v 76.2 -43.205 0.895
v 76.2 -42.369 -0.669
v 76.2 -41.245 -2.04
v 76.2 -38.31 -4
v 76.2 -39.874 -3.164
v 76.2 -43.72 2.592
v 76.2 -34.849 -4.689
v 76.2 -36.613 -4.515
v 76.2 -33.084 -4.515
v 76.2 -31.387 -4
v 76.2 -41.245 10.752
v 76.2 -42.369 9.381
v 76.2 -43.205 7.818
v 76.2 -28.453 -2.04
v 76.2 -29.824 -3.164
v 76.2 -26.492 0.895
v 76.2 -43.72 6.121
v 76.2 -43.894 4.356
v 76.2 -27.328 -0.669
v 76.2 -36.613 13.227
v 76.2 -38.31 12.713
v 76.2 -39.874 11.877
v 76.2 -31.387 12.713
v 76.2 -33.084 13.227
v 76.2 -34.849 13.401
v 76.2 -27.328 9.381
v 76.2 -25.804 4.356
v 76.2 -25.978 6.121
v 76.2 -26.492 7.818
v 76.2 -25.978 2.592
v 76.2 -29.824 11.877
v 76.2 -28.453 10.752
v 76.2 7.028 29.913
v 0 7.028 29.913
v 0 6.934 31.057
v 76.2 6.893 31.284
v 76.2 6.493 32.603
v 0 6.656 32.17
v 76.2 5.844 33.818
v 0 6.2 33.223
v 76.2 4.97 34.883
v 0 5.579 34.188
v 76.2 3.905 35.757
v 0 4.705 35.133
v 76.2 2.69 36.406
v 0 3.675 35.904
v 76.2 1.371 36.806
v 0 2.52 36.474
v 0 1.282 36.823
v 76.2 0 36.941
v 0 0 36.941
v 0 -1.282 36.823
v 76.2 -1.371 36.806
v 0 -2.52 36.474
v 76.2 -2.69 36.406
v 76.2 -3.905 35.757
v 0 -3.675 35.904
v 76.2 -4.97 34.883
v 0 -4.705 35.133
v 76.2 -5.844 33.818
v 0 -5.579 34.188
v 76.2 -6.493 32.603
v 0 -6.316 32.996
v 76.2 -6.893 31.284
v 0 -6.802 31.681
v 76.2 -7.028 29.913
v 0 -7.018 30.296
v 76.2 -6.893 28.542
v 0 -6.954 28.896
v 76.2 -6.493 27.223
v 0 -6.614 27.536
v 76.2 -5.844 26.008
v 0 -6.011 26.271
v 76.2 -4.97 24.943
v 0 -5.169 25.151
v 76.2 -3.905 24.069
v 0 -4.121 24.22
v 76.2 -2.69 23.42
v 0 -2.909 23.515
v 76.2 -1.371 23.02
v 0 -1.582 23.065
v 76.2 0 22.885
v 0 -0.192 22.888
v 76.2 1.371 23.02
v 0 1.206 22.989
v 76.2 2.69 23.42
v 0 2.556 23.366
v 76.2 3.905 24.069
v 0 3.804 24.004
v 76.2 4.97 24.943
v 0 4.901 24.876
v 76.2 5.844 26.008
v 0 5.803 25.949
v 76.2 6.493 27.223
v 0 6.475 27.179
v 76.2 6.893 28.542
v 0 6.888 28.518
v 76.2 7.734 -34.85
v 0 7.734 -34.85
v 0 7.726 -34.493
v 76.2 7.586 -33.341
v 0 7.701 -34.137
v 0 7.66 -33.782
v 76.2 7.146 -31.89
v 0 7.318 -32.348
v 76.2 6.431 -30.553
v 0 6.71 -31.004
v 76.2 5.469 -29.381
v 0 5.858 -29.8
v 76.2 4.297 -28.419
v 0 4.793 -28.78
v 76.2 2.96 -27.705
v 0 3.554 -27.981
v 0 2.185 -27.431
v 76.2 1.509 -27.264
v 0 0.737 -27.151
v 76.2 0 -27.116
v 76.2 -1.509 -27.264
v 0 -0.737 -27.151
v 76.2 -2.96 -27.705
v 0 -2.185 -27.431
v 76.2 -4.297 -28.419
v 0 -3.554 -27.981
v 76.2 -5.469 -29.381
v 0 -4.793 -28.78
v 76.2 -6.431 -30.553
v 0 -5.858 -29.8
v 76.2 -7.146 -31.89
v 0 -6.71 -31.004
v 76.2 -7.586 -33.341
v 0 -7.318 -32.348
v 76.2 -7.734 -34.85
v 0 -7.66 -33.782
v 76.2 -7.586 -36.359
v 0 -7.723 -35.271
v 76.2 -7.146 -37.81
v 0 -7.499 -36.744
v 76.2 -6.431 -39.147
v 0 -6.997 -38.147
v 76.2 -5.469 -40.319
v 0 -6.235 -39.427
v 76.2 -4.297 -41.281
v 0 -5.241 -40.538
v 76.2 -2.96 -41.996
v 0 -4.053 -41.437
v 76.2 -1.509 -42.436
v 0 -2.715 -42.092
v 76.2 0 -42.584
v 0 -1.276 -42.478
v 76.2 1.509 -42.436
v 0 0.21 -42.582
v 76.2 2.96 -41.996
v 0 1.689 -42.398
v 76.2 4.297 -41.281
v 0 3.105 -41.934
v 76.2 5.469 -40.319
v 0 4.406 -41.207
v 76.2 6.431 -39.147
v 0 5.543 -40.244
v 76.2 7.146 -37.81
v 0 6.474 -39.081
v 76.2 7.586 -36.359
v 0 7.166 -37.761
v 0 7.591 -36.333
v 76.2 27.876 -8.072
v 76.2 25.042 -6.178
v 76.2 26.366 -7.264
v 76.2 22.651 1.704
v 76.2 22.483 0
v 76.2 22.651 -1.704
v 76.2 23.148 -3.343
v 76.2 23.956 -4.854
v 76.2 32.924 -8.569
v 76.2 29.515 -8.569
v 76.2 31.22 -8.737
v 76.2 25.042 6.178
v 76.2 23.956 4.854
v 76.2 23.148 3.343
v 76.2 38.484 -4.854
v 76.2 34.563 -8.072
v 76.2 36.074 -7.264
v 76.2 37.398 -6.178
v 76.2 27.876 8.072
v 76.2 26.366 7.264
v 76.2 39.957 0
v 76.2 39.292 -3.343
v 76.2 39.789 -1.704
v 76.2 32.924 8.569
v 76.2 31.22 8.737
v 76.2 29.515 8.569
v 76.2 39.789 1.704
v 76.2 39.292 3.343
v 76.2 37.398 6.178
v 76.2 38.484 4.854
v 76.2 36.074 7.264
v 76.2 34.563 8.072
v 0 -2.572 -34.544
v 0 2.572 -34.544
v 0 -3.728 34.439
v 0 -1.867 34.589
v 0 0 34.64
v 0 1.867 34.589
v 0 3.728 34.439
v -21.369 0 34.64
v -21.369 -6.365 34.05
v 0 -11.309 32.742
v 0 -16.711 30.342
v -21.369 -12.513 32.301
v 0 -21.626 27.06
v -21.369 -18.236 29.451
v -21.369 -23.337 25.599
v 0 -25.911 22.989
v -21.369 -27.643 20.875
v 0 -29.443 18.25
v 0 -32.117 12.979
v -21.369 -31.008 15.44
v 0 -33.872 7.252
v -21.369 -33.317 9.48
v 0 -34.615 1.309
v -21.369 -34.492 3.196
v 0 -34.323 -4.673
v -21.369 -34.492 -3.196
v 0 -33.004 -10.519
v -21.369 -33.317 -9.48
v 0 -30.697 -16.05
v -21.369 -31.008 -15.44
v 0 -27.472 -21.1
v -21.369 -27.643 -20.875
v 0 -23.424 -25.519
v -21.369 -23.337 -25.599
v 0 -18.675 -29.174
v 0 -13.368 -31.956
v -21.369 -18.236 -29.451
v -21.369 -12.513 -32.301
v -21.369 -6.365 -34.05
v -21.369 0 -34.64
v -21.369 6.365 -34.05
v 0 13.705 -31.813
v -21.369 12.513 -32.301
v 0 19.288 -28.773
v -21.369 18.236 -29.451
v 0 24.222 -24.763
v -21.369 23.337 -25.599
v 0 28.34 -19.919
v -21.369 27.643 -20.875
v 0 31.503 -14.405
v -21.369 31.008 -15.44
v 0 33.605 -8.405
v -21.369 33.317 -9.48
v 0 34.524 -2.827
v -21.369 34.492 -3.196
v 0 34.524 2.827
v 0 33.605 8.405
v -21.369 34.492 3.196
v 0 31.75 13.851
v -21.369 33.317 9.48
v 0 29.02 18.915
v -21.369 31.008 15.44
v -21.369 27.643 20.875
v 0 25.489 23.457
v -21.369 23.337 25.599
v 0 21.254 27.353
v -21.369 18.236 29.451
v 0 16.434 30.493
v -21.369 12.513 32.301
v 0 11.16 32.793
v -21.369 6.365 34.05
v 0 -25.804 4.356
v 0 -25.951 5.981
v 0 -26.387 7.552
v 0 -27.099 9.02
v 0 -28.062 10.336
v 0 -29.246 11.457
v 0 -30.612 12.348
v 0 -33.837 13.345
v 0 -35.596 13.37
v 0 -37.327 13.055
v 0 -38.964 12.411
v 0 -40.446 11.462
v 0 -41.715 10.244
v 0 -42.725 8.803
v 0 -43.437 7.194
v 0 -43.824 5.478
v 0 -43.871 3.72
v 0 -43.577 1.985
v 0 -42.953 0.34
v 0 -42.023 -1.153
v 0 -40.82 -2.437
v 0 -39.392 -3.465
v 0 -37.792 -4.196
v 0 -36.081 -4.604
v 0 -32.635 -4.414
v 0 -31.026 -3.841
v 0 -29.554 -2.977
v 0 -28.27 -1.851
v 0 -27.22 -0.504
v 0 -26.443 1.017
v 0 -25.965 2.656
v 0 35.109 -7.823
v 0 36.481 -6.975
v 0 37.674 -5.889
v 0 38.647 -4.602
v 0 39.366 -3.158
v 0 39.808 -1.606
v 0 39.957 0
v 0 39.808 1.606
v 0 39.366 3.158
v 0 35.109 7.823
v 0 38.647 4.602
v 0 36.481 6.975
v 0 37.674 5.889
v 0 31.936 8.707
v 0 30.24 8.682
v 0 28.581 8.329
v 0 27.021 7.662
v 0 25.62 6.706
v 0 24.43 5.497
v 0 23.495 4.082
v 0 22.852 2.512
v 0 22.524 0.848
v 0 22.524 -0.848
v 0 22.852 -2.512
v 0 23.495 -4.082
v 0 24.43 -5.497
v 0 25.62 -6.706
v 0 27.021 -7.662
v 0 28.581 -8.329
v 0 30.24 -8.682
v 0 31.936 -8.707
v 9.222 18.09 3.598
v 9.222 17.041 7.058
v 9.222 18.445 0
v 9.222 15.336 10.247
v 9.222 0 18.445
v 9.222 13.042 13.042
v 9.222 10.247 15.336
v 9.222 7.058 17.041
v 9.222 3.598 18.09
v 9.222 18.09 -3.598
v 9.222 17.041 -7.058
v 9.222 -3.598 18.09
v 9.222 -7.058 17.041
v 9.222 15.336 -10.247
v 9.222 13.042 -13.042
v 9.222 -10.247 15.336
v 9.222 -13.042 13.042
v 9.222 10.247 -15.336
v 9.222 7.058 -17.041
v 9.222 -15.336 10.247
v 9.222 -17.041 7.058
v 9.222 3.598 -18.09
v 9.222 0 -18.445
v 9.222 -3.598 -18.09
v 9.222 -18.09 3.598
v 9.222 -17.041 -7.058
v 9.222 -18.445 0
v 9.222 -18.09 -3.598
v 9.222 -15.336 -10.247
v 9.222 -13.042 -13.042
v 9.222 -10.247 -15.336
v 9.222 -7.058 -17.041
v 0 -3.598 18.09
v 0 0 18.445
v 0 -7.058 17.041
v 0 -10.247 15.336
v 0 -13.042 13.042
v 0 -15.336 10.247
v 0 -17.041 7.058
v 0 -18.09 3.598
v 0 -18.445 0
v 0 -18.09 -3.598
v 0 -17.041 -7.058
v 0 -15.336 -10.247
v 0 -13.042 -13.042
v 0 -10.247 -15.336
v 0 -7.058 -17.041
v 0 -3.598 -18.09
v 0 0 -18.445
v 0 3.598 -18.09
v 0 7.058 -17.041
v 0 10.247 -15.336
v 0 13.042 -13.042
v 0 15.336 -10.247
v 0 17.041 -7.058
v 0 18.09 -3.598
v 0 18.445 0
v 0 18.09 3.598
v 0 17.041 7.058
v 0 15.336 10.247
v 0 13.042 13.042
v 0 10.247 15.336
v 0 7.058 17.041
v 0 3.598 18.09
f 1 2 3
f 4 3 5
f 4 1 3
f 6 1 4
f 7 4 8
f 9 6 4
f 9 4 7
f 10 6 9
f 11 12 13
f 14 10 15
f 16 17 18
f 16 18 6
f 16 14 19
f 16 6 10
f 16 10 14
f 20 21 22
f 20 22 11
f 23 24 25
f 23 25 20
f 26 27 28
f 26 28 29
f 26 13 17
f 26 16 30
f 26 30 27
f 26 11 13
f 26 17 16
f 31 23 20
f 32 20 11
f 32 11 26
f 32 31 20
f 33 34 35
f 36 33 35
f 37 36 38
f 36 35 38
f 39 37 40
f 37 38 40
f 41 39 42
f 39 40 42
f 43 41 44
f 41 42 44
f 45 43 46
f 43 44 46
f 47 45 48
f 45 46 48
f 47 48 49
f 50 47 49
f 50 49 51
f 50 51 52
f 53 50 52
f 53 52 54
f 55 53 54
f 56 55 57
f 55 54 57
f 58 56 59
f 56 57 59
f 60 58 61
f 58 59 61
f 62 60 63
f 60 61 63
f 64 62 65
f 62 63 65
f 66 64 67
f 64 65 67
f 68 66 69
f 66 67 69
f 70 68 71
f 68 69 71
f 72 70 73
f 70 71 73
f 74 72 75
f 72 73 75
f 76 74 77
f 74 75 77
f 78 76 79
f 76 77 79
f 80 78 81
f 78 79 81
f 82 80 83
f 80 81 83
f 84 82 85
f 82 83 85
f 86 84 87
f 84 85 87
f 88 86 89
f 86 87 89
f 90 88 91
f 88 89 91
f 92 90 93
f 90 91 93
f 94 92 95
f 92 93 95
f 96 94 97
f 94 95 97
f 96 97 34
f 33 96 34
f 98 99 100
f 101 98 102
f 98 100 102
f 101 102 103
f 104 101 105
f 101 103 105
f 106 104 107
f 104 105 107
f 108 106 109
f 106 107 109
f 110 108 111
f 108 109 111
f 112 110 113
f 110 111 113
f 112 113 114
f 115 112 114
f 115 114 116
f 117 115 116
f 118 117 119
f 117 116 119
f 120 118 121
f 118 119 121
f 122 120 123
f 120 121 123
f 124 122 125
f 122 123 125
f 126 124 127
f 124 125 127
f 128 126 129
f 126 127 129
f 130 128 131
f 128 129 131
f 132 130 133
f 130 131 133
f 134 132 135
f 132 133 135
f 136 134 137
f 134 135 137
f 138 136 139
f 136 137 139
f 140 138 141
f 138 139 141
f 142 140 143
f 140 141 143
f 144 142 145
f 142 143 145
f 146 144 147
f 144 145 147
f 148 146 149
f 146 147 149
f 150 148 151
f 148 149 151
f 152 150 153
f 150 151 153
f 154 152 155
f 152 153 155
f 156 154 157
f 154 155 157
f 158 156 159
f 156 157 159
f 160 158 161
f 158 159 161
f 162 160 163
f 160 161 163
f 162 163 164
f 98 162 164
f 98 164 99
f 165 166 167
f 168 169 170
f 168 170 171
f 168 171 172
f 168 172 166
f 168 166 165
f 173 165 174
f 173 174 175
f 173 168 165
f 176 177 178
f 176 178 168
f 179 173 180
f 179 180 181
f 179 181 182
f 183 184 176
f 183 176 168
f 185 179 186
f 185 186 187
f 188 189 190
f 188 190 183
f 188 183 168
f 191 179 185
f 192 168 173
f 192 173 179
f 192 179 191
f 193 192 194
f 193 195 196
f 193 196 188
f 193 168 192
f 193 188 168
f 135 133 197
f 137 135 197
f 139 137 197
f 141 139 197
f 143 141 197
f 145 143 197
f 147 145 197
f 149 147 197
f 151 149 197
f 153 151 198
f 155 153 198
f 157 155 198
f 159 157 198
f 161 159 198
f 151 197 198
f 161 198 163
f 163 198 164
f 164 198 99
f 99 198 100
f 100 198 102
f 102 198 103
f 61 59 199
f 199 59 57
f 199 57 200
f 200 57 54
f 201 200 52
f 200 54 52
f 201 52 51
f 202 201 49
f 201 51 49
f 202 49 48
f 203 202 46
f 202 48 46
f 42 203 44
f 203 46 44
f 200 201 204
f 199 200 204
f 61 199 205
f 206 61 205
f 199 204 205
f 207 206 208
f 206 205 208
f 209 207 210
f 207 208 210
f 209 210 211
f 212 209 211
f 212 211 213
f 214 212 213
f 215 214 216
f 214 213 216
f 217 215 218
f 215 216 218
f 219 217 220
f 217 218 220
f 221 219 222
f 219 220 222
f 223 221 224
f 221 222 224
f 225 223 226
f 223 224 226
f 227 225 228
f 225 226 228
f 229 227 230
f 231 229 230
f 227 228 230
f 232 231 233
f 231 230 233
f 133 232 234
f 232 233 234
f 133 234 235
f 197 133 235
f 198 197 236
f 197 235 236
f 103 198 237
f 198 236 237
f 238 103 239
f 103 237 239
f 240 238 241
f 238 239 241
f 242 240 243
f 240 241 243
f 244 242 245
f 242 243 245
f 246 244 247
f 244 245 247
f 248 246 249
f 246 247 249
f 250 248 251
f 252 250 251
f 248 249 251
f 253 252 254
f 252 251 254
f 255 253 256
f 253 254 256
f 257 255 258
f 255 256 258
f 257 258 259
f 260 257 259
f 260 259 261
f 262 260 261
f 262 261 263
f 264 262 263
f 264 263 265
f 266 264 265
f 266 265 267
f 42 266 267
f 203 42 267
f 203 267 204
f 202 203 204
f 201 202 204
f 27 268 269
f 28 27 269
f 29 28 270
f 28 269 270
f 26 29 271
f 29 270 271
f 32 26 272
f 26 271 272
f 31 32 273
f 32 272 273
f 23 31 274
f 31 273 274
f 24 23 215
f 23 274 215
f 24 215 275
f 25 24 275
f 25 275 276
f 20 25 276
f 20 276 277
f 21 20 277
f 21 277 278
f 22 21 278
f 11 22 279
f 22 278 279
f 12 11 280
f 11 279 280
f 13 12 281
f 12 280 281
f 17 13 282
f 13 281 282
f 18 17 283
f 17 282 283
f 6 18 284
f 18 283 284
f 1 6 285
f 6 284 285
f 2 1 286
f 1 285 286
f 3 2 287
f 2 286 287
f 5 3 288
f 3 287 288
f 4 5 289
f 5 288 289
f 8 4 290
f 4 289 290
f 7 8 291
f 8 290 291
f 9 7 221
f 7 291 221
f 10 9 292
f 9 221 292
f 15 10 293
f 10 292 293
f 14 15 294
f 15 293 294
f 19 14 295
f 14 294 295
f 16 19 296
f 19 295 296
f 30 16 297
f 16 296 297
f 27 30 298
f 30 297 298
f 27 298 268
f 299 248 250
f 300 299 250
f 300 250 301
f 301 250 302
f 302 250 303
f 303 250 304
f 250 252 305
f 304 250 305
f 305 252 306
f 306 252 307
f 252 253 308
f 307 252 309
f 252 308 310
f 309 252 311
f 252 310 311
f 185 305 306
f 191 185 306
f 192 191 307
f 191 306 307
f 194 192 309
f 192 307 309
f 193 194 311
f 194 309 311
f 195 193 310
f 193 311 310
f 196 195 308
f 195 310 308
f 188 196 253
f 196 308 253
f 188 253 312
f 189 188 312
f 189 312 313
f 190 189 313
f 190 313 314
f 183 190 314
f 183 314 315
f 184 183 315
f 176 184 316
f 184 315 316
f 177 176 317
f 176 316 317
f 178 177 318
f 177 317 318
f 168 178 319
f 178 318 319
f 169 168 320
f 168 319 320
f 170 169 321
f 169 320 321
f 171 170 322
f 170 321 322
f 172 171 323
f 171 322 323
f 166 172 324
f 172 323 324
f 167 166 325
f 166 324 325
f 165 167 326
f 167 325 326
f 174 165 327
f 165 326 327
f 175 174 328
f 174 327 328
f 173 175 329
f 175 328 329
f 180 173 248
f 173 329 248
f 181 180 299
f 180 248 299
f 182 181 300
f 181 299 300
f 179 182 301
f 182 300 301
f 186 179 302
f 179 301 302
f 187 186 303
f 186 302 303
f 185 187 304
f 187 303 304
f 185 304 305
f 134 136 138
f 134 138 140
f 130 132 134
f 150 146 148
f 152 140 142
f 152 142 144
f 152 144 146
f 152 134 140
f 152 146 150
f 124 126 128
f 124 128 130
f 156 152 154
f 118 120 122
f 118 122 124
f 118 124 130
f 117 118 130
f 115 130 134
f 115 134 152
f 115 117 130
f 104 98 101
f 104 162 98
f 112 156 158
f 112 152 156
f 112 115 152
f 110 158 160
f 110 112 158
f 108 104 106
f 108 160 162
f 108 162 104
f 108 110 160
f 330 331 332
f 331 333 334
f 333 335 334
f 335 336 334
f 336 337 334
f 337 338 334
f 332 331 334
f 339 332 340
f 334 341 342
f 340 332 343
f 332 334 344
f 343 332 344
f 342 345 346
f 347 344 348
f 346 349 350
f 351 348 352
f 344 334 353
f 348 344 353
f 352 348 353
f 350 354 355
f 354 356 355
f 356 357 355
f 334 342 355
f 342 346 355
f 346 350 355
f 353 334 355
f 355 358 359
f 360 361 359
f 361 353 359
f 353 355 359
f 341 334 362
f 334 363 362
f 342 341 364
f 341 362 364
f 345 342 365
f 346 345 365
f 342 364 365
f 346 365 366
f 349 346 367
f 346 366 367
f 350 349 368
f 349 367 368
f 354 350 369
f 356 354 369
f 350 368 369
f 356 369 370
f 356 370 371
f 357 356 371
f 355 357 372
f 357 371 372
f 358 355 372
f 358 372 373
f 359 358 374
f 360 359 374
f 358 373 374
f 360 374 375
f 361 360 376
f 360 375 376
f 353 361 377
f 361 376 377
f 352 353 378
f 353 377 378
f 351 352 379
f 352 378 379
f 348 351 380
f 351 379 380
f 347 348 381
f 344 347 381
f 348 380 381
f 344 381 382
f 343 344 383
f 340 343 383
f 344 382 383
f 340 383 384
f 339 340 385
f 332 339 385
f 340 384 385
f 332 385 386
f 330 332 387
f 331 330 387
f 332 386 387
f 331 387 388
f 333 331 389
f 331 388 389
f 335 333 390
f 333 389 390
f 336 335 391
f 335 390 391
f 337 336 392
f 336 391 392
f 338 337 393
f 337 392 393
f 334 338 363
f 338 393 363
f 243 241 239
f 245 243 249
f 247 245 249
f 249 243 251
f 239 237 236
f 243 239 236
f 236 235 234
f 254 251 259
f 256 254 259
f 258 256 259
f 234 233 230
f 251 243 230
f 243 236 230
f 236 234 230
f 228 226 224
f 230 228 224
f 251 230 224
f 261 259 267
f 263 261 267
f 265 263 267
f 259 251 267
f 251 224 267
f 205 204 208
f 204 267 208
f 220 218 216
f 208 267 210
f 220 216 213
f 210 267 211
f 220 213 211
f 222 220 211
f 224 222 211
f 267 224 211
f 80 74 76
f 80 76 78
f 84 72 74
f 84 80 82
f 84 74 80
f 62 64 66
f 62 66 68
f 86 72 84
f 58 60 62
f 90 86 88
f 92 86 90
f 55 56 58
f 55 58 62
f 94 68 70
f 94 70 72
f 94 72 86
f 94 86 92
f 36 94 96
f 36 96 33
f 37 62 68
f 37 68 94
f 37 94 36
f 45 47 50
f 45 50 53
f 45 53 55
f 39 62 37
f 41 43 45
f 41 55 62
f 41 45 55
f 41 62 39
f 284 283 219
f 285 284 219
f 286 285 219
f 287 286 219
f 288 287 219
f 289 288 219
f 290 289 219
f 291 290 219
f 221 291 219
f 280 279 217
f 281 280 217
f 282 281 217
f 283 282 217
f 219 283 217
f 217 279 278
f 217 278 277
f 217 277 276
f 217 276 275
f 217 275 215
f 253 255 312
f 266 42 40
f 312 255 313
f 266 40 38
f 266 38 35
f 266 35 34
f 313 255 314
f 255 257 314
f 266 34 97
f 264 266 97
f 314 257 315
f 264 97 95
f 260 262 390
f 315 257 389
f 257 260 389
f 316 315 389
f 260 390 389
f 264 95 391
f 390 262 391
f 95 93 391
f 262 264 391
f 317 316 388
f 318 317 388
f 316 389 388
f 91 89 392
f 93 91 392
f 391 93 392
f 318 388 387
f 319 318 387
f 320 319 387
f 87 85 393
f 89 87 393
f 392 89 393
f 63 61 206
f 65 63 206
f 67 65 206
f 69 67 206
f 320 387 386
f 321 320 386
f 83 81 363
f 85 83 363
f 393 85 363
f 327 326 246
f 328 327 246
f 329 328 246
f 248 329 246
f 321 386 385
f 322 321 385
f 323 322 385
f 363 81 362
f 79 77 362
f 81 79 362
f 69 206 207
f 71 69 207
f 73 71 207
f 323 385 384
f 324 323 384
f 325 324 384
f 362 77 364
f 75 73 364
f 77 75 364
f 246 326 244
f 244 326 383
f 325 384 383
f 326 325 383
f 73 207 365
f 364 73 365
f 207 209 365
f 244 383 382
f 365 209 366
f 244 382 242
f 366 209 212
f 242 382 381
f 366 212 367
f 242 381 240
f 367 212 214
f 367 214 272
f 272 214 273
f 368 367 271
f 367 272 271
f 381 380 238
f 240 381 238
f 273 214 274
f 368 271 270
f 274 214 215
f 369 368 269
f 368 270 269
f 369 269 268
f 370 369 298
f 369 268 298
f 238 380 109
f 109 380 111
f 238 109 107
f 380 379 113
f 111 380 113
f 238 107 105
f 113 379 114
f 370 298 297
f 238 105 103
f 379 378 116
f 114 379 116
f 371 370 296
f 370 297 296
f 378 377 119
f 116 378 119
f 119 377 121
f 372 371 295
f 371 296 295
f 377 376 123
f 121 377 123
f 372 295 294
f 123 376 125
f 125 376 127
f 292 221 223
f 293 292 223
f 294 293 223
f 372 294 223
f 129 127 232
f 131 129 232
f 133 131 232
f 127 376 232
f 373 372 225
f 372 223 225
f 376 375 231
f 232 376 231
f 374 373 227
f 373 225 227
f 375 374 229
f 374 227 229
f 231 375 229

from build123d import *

# Parameters (mm, degrees)
F2_R     = 7.734325
F2_R_2   = 9.044999
F2_R_3   = 7.028051
F2_R_4   = 8.736696
F3_DEPTH = 76.2


with BuildPart() as f1:
    # F0 (on Front) → F1 (revolve)
    with BuildSketch(Plane.XZ):
        Polygon((0, 34.639813), (-21.368708, 34.639813), (-21.368708, 0), (9.222291, 0), (9.222291, 18.444577), (0, 18.444577), align=None)
    revolve(axis=Axis((-6.073209, 0, 0), (1, 0, 0)))

    # F2 (on Right) → F3 (join)
    with BuildSketch(Plane.YZ):
        with Locations((0, -34.850091)):
            Circle(F2_R)
        with Locations((-34.8488, 4.356261)):
            Circle(F2_R_2)
        with Locations((0, 29.912995)):
            Circle(F2_R_3)
        with Locations((31.21987, 0)):
            Circle(F2_R_4)
    extrude(amount=F3_DEPTH)


solid = f1.part
